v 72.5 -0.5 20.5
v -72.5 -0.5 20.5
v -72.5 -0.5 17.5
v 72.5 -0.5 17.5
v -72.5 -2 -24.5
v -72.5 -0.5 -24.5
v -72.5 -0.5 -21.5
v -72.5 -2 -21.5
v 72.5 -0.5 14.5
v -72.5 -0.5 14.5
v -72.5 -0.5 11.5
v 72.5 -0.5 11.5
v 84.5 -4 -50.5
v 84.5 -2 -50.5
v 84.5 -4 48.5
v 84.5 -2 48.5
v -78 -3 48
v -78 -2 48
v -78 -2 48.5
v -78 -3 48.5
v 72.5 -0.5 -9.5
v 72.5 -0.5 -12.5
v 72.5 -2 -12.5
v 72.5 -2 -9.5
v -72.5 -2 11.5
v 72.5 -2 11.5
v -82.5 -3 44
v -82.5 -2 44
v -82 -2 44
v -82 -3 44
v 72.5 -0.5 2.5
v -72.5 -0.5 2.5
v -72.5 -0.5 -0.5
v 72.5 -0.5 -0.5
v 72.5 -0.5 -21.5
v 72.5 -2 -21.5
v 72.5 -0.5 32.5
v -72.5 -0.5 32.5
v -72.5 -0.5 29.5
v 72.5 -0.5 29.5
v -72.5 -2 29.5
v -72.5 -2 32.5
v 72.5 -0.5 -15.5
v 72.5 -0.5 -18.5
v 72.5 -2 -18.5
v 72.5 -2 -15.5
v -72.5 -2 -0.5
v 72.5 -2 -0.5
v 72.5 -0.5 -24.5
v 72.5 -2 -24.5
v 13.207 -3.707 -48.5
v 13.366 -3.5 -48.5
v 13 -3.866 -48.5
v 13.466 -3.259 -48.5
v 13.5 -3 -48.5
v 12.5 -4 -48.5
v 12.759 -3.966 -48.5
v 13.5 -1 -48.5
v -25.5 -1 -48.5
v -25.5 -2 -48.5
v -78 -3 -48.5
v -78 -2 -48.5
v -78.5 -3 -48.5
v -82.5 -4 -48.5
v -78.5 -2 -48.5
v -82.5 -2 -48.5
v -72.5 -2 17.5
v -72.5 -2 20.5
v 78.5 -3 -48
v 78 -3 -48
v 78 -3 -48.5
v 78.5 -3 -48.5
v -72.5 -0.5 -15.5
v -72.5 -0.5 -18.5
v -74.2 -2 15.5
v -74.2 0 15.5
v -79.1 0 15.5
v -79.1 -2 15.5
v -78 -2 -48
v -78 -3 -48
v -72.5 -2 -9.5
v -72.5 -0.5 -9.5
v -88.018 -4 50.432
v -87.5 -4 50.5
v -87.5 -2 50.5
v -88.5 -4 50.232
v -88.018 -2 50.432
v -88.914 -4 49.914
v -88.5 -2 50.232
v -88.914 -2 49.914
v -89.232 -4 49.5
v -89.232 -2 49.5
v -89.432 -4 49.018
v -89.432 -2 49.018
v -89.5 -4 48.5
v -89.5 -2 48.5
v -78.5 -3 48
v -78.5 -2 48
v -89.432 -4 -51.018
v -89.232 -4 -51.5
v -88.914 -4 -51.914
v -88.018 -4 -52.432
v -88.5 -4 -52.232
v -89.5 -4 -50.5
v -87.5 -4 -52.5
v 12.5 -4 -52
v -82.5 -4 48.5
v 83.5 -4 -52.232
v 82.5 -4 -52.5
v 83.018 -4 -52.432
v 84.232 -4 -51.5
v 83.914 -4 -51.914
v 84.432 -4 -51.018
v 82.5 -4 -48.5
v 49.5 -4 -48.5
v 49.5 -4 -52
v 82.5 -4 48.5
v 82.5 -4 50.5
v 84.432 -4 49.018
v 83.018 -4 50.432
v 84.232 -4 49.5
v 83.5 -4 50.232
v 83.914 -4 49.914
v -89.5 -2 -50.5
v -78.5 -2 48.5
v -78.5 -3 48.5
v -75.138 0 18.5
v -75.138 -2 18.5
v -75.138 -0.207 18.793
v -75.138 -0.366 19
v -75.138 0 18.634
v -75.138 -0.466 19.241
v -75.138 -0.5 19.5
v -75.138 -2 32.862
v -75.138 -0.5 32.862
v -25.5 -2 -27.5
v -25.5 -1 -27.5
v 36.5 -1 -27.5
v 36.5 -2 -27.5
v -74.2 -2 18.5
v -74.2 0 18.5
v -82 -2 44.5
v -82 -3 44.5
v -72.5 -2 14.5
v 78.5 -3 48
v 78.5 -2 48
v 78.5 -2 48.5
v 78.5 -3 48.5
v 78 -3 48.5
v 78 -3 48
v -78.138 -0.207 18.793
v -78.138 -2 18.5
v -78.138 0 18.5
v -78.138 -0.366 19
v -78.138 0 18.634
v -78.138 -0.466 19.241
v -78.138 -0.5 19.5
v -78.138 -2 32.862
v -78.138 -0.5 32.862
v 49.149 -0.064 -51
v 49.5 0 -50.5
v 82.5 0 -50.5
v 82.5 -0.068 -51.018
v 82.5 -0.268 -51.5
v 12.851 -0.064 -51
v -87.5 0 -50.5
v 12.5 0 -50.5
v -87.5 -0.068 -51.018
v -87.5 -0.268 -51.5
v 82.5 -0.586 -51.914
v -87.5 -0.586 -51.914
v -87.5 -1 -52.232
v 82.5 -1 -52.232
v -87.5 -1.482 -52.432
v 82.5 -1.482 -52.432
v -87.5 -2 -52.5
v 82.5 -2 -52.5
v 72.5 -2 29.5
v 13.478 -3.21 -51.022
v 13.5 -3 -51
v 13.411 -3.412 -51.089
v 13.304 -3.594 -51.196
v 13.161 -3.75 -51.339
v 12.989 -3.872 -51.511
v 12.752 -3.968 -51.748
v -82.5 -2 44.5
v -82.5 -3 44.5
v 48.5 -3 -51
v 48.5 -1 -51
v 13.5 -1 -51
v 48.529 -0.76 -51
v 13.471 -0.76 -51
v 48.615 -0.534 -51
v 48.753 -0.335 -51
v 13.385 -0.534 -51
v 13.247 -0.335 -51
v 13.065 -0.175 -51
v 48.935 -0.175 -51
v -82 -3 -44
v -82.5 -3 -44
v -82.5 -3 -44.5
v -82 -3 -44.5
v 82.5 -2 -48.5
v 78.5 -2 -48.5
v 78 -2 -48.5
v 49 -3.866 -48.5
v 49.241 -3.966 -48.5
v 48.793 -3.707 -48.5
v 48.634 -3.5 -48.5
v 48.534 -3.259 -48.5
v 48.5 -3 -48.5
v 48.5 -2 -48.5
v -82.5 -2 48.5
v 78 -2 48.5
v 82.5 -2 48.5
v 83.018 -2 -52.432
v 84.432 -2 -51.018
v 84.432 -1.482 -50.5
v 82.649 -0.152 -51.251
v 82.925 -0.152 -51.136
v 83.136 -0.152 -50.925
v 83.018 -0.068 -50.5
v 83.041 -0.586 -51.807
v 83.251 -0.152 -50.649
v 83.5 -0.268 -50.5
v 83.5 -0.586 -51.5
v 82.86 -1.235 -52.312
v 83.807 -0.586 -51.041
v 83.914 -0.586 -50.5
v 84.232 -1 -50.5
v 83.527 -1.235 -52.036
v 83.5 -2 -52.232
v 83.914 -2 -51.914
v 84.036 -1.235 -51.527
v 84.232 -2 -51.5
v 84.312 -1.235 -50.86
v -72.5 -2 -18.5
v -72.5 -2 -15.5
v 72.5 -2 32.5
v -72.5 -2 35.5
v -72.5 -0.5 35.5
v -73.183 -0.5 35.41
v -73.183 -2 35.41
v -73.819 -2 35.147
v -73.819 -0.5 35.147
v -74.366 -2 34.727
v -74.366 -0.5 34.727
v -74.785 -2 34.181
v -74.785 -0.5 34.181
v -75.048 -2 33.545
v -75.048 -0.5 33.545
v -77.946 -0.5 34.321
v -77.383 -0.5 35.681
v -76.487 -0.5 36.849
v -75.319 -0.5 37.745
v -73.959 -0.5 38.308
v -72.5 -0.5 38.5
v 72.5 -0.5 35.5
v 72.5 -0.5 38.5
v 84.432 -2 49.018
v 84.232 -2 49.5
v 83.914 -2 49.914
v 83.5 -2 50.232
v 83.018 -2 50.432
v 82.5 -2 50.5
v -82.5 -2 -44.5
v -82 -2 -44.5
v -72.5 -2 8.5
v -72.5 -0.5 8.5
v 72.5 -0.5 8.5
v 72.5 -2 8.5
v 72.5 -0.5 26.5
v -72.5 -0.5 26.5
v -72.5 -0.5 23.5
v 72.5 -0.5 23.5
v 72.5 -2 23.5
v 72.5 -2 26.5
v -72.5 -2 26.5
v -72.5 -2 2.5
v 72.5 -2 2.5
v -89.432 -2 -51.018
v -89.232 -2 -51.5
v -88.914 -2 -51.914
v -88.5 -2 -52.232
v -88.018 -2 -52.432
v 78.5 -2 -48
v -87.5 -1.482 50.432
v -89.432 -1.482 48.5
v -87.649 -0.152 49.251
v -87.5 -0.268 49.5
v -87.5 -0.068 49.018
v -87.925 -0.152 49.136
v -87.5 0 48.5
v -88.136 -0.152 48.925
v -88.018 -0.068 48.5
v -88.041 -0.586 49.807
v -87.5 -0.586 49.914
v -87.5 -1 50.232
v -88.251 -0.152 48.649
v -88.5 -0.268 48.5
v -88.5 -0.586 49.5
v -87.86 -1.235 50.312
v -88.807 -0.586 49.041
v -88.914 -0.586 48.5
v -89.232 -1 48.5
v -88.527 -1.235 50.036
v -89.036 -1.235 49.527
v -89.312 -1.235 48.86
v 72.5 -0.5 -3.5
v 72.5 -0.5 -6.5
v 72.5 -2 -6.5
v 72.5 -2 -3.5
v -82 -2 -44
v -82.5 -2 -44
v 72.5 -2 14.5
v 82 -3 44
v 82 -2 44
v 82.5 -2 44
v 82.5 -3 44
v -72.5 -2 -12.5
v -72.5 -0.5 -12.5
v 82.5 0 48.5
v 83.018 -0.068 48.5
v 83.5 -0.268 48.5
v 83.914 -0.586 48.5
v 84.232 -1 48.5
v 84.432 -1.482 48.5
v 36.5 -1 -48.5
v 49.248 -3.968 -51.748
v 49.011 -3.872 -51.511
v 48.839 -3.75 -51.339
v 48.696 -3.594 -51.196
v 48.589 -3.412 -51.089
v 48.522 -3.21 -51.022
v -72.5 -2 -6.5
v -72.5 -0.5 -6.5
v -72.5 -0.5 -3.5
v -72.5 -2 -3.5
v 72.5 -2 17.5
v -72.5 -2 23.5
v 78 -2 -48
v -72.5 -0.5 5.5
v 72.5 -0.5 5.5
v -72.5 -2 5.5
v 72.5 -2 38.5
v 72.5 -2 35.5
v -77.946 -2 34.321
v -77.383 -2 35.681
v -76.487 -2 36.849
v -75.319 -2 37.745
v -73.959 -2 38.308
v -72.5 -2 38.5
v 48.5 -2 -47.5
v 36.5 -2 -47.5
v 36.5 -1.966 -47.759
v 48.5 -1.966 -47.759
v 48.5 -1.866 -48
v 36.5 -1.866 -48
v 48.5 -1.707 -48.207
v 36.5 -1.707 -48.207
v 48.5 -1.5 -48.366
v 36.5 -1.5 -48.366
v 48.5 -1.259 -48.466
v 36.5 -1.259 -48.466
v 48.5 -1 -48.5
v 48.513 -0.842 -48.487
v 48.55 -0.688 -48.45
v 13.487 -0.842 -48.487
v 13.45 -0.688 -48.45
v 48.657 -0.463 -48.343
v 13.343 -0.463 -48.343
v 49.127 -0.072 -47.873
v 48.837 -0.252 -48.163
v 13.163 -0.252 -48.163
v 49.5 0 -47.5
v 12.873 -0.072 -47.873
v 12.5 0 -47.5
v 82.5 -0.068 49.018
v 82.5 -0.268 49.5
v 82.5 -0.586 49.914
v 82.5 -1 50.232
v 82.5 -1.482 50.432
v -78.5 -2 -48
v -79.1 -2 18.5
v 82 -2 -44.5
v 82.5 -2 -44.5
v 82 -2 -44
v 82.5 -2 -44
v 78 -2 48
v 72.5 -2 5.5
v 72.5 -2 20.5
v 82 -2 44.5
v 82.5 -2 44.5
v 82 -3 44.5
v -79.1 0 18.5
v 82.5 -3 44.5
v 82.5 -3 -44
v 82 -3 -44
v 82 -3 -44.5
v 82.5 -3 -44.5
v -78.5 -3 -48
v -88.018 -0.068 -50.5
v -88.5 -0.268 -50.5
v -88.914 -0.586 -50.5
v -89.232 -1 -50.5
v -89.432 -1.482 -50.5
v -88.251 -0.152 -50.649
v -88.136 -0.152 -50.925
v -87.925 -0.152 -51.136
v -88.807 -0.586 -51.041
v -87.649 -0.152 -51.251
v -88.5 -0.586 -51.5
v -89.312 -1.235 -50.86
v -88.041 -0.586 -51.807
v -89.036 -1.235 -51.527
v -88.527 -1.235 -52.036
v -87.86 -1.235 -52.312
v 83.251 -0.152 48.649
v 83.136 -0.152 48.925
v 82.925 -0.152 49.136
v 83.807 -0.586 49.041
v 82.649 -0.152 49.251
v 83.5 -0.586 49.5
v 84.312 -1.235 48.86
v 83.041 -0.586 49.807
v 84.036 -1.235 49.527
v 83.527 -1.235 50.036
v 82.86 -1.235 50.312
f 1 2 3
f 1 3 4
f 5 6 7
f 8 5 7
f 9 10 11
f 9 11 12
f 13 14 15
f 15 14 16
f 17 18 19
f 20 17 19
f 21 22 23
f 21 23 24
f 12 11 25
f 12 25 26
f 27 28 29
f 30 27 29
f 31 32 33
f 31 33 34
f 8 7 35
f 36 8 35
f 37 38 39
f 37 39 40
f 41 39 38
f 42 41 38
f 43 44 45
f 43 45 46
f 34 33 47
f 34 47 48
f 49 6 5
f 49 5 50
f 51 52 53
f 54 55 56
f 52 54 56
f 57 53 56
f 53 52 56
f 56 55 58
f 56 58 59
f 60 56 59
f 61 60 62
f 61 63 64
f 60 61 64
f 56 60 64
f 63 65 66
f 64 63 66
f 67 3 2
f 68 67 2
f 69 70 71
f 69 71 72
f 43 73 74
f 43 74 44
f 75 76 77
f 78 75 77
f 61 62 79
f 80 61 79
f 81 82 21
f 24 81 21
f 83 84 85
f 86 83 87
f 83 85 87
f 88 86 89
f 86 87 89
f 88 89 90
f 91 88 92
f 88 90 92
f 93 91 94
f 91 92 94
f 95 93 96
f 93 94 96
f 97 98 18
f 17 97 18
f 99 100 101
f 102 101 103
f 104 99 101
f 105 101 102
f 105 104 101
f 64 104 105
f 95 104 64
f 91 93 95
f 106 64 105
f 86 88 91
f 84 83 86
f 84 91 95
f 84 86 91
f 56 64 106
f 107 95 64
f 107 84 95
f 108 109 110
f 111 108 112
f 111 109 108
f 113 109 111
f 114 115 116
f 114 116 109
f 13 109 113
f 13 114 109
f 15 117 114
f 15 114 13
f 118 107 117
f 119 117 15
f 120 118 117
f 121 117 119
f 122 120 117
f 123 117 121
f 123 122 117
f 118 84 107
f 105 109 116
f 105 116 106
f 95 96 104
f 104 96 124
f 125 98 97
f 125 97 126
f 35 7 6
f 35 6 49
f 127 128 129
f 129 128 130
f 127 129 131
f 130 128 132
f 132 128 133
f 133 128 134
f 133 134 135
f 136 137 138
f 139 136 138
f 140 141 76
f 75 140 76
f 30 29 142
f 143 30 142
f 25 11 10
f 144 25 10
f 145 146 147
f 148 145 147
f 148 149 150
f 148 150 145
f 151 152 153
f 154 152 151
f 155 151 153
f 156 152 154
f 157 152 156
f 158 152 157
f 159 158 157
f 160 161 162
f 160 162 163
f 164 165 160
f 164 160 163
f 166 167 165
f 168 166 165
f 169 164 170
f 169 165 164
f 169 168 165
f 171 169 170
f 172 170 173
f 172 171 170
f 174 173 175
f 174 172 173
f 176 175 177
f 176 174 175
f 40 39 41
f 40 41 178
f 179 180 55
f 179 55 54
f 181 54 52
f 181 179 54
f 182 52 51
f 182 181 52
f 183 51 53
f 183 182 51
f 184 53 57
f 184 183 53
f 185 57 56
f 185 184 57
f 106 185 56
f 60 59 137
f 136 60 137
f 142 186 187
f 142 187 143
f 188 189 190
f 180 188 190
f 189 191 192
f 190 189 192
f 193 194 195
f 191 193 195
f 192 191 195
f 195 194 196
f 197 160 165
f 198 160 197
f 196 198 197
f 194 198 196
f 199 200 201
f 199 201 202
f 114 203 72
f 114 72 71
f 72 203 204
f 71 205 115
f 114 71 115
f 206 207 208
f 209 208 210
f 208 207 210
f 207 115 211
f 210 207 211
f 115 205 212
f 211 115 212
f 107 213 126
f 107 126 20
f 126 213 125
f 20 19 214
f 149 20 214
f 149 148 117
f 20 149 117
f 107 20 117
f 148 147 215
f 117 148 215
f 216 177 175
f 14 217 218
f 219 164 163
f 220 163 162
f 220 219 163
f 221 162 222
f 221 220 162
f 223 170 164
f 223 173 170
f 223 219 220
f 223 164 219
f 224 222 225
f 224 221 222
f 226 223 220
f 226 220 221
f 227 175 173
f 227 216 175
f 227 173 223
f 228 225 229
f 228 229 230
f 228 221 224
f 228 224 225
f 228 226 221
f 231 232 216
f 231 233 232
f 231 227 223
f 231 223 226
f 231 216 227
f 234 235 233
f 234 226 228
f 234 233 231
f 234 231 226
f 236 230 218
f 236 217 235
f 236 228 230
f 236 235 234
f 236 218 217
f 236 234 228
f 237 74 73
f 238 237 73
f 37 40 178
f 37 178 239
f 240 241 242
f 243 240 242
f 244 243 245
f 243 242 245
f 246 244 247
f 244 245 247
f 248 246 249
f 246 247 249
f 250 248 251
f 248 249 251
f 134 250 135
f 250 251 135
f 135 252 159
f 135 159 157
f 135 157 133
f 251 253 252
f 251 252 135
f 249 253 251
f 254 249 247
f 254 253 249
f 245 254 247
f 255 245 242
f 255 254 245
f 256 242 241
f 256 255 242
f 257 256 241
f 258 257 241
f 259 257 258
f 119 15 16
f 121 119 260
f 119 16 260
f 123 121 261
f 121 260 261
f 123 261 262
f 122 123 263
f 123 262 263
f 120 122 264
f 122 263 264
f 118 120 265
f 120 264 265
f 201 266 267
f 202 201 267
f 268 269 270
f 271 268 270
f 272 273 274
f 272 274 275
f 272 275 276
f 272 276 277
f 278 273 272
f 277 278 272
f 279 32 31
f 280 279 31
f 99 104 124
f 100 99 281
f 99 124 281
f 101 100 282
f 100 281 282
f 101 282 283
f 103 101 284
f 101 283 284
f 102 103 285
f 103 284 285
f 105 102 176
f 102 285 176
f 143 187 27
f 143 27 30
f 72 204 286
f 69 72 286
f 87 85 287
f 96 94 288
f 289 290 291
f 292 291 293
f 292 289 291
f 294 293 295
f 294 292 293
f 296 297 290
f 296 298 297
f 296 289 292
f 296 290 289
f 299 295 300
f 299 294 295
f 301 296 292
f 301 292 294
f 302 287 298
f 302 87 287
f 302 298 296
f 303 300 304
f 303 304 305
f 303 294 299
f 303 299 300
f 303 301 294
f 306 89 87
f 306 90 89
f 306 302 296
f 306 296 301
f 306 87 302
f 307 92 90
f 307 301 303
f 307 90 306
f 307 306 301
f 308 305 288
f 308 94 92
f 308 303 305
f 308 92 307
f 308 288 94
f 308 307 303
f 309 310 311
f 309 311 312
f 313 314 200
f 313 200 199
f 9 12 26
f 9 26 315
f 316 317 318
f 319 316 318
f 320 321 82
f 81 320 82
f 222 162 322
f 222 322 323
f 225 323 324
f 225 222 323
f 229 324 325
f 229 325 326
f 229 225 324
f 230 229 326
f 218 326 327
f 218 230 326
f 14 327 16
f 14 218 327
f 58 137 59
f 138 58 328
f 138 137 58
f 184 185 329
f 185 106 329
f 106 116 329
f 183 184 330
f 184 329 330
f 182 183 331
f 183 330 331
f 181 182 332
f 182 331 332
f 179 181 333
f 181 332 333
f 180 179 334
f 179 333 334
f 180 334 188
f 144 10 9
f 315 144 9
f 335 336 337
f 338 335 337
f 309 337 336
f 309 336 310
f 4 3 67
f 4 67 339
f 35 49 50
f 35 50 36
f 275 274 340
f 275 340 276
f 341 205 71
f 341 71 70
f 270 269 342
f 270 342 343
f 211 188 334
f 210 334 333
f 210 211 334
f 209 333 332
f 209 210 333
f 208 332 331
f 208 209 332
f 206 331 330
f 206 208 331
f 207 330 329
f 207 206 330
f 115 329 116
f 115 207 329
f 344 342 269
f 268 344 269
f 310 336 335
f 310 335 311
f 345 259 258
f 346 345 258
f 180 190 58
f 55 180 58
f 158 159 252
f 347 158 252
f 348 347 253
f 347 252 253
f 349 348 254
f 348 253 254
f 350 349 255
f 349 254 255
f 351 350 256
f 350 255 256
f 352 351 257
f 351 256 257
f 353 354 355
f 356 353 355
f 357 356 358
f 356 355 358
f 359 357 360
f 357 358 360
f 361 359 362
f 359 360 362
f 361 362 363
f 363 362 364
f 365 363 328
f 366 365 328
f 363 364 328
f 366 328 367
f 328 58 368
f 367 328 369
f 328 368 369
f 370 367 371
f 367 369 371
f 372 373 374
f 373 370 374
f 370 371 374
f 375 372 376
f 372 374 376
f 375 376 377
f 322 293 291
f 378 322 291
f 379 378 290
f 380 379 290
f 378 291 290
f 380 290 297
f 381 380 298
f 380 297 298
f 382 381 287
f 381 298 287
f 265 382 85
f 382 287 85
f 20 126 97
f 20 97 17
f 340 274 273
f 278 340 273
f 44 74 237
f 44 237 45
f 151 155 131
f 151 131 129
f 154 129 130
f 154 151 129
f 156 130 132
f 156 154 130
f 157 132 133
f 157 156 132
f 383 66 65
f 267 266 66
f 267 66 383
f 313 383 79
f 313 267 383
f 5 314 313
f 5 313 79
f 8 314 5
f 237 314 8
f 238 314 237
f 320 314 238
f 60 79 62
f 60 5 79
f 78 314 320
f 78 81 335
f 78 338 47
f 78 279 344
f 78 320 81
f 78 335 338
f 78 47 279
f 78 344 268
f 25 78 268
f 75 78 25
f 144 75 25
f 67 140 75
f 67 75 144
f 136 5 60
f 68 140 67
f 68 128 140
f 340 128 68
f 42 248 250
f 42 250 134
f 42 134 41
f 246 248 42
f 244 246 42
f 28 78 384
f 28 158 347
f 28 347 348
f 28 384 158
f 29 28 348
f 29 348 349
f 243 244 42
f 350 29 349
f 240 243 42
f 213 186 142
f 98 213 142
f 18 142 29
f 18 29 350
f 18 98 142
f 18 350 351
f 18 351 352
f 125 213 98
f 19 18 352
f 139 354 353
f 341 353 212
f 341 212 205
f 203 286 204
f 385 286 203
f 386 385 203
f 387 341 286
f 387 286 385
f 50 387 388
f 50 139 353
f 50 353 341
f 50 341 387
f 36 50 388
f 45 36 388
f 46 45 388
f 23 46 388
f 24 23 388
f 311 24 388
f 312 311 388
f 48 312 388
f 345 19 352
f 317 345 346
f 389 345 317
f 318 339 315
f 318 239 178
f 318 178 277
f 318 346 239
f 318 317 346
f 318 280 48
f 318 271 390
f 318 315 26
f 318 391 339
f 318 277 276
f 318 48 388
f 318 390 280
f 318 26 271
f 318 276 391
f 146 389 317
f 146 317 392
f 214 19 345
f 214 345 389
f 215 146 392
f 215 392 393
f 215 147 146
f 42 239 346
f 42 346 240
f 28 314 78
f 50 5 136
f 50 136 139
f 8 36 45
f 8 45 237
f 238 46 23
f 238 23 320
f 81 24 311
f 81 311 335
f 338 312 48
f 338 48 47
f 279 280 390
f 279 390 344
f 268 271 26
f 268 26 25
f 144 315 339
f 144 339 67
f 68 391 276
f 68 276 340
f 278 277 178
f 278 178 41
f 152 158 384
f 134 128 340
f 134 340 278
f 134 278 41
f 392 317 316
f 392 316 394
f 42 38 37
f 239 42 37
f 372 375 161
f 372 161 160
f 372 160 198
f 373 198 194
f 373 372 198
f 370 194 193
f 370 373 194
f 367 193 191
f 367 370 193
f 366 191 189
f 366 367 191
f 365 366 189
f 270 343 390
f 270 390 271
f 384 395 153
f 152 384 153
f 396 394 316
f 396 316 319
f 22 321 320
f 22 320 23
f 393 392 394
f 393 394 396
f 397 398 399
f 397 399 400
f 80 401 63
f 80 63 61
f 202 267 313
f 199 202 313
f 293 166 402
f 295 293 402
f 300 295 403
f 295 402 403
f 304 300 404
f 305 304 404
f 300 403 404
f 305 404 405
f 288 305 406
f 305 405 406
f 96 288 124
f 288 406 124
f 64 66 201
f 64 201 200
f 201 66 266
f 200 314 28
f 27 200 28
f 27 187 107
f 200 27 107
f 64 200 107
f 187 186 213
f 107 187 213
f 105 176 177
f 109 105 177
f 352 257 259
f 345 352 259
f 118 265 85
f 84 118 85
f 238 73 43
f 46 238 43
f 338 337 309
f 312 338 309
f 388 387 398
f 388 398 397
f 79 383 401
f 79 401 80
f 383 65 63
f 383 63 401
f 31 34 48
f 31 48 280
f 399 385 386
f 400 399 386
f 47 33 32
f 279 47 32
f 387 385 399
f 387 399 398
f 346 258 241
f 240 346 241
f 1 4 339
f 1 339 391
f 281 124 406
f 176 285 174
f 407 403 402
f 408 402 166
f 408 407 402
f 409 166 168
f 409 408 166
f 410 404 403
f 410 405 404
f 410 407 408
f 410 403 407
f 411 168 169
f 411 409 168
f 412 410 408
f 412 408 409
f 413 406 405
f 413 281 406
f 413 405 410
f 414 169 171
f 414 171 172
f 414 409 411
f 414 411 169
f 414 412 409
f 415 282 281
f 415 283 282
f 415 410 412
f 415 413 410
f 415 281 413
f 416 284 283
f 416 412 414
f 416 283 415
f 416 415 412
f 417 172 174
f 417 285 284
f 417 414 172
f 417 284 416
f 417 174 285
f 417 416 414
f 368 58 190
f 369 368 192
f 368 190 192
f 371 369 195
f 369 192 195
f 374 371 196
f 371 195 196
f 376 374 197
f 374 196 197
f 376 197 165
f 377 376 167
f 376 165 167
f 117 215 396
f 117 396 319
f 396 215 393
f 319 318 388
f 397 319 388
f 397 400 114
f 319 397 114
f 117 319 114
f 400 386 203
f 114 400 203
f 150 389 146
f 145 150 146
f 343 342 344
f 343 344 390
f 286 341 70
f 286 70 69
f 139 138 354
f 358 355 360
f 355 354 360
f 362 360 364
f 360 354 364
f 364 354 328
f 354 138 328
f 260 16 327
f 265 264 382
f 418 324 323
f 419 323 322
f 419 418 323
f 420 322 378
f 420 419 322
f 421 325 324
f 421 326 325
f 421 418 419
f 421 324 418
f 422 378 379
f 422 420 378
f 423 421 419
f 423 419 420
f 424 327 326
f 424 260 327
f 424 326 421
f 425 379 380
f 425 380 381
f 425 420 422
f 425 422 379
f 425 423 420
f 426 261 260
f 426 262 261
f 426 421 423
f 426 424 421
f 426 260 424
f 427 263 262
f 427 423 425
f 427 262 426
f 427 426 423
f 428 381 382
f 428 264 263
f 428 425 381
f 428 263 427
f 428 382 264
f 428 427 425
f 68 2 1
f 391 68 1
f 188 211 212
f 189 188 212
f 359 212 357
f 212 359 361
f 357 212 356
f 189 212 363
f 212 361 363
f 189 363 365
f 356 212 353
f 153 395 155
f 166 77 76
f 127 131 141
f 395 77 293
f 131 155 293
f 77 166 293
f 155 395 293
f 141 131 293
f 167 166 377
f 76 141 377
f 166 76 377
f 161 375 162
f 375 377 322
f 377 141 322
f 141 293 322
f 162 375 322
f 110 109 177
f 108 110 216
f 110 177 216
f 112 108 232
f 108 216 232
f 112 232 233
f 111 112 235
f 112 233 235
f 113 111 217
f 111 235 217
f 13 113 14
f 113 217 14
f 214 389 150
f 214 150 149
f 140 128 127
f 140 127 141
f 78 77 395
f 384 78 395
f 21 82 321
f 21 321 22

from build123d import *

# Parameters (mm, degrees)
F1_DEPTH     = 1
F0_W         = 145
F0_H         = 3
F2_DEPTH     = 2
F3_DEPTH     = 0.5
F0_W_2       = 0.5
F0_H_2       = 0.5
F4_DEPTH     = 3
F5_DEPTH     = 4
F6_T1_DEPTH  = 99
F6_T3_DEPTH  = 170
F6_T6_ANGLE  = 90
F6_T8_ANGLE  = 90
F6_T10_ANGLE = 90
F6_T12_ANGLE = 90
F7_T1_DEPTH  = 35
F7_T3_DEPTH  = 5
F7_T5_DEPTH  = 14.5
F7_T7_DEPTH  = 2.9999986291
F7_T12_DEPTH = 4.5
F7_T17_DEPTH = 4.5
F7_T23_DEPTH = 5
F7_T28_DEPTH = 37.5
F7_T35_DEPTH = 5
F7_T40_DEPTH = 37.5
F7_T47_DEPTH = 37.5
F7_T51_DEPTH = 7
F7_T58_DEPTH = 37.5
F7_T62_DEPTH = 7


# Not quite as in the source:
# - a fillet or chamfer that OpenCascade refuses, or shapes differently, is made with other operations: its cross-section is extruded or revolved along the edge and cut away or added
# - two fillets or chamfers of one size are made in one step
# - ends of sketch curves that miss each other by under 0.0002 mm in the source are joined
# - a feature names something its author has since deleted; it is built from what else it names


with BuildPart() as f1:
    # F0 (on Front) → F1 (new body)
    with BuildSketch(Plane.XZ):
        Polygon((-25.5, -27.5), (-25.5, -48.5), (13.5, -48.5), (36.5, -48.5), (36.5, -27.5), align=None)
    extrude(amount=F1_DEPTH)

    # F0 (on Front) → F2 (join)
    with BuildSketch(Plane.XZ):
        Polygon((-78.5, 48.5), (-82.5, 48.5), (-82.5, 44.5), (-82, 44.5), (-82, 44), (-82.5, 44), (-82.5, -44), (-82, -44), (-82, -44.5), (-82.5, -44.5), (-82.5, -48.5), (-78.5, -48.5), (-78.5, -48), (-78, -48), (-78, -48.5), (-25.5, -48.5), (-25.5, -27.5), (36.5, -27.5), (36.5, -48.5), (48.5, -48.5), (78, -48.5), (78, -48), (78.5, -48), (78.5, -48.5), (82.5, -48.5), (82.5, -44.5), (82, -44.5), (82, -44), (82.5, -44), (82.5, 44), (82, 44), (82, 44.5), (82.5, 44.5), (82.5, 48.5), (78.5, 48.5), (78.5, 48), (78, 48), (78, 48.5), (-78, 48.5), (-78, 48), (-78.5, 48), align=None)
        with Locations((0, -23)):
            Rectangle(F0_W, F0_H, mode=Mode.SUBTRACT)
        with Locations((0, -17)):
            Rectangle(F0_W, F0_H, mode=Mode.SUBTRACT)
        with Locations((0, -11)):
            Rectangle(F0_W, F0_H, mode=Mode.SUBTRACT)
        with Locations((0, -5)):
            Rectangle(F0_W, F0_H, mode=Mode.SUBTRACT)
        with BuildLine():
            ThreePointArc((-78.1382620335, 32.8617365956), (-76.486853318, 36.8485899136), (-72.5, 38.4999986291))
            Line((-72.5, 38.4999986291), (72.5, 38.5))
            Line((72.5, 38.5), (72.5, 35.5))
            Line((72.5, 35.5), (-72.5, 35.5))
            ThreePointArc((-72.5, 35.5), (-74.3655339438, 34.7272705394), (-75.1382634044, 32.8617365956))
            Line((-75.1382634044, 32.8617365956), (-75.1382634044, 18.5))
            Line((-75.1382634044, 18.5), (-74.2, 18.5))
            Line((-74.2, 18.5), (-74.2, 15.5))
            Line((-74.2, 15.5), (-79.1, 15.5))
            Line((-79.1, 15.5), (-79.1, 18.5))
            Line((-79.1, 18.5), (-78.1382620335, 18.5))
            Line((-78.1382620335, 18.5), (-78.1382620335, 32.8617365956))
        make_face(mode=Mode.SUBTRACT)
        with Locations((0, 1)):
            Rectangle(F0_W, F0_H, mode=Mode.SUBTRACT)
        with Locations((0, 7)):
            Rectangle(F0_W, F0_H, mode=Mode.SUBTRACT)
        with Locations((0, 13)):
            Rectangle(F0_W, F0_H, mode=Mode.SUBTRACT)
        with Locations((0, 19)):
            Rectangle(F0_W, F0_H, mode=Mode.SUBTRACT)
        with Locations((0, 25)):
            Rectangle(F0_W, F0_H, mode=Mode.SUBTRACT)
        with Locations((0, 31)):
            Rectangle(F0_W, F0_H, mode=Mode.SUBTRACT)
    extrude(amount=F2_DEPTH)

    # F0 (on Front) → F3 (join)
    with BuildSketch(Plane.XZ):
        with Locations((0, 37)):
            Rectangle(F0_W, F0_H)
        with Locations((0, 31)):
            Rectangle(F0_W, F0_H)
        with Locations((0, 25)):
            Rectangle(F0_W, F0_H)
        with Locations((0, 19)):
            Rectangle(F0_W, F0_H)
        with Locations((0, 13)):
            Rectangle(F0_W, F0_H)
        with Locations((0, 7)):
            Rectangle(F0_W, F0_H)
        with Locations((0, 1)):
            Rectangle(F0_W, F0_H)
        with Locations((0, -5)):
            Rectangle(F0_W, F0_H)
        with Locations((0, -11)):
            Rectangle(F0_W, F0_H)
        with Locations((0, -17)):
            Rectangle(F0_W, F0_H)
        with Locations((0, -23)):
            Rectangle(F0_W, F0_H)
        with BuildLine():
            Line((-72.5, 35.5), (-72.5, 38.5))
            ThreePointArc((-72.5, 38.5), (-76.486853318, 36.8485899136), (-78.1382620335, 32.8617365956))
            Line((-78.1382620335, 32.8617365956), (-78.1382620335, 18.5))
            Line((-78.1382620335, 18.5), (-75.1382634044, 18.5))
            Line((-75.1382634044, 18.5), (-75.1382634044, 32.8617365956))
            ThreePointArc((-75.1382634044, 32.8617365956), (-74.3655339438, 34.7272705394), (-72.5, 35.5))
        make_face()
    extrude(amount=F3_DEPTH)

    # F0 (on Front) → F4 (join)
    with BuildSketch(Plane.XZ):
        with Locations((-82.25, 44.25)):
            Rectangle(F0_W_2, F0_H_2)
        with Locations((-78.25, 48.25)):
            Rectangle(F0_W_2, F0_H_2)
        with Locations((-82.25, -44.25)):
            Rectangle(F0_W_2, F0_H_2)
        with Locations((-78.25, -48.25)):
            Rectangle(F0_W_2, F0_H_2)
        with Locations((82.25, -44.25)):
            Rectangle(F0_W_2, F0_H_2)
        with Locations((78.25, -48.25)):
            Rectangle(F0_W_2, F0_H_2)
        with Locations((78.25, 48.25)):
            Rectangle(F0_W_2, F0_H_2)
        with Locations((82.25, 44.25)):
            Rectangle(F0_W_2, F0_H_2)
    extrude(amount=F4_DEPTH)

    # F0 (on Front) → F5 (join)
    with BuildSketch(Plane.XZ):
        with BuildLine():
            Line((82.5, 50.5), (-87.5, 50.5))
            ThreePointArc((-87.5, 50.5), (-88.9142135624, 49.9142135624), (-89.5, 48.5))
            Line((-89.5, 48.5), (-89.5, -50.5))
            ThreePointArc((-89.5, -50.5), (-88.9142135624, -51.9142135624), (-87.5, -52.5))
            Line((-87.5, -52.5), (82.5, -52.5))
            ThreePointArc((82.5, -52.5), (83.9142135624, -51.9142135624), (84.5, -50.5))
            Line((84.5, -50.5), (84.5, 48.5))
            ThreePointArc((84.5, 48.5), (83.9142135624, 49.9142135624), (82.5, 50.5))
        make_face()
        Polygon((-82.5, 44.5), (-82.5, 48.5), (-78.5, 48.5), (-78, 48.5), (78, 48.5), (78.5, 48.5), (82.5, 48.5), (82.5, 44.5), (82.5, 44), (82.5, -44), (82.5, -44.5), (82.5, -48.5), (78.5, -48.5), (78, -48.5), (48.5, -48.5), (48.5, -51), (13.5, -51), (13.5, -48.5), (-25.5, -48.5), (-78, -48.5), (-78.5, -48.5), (-82.5, -48.5), (-82.5, -44.5), (-82.5, -44), (-82.5, 44), align=None, mode=Mode.SUBTRACT)
    extrude(amount=F5_DEPTH)

    # F6: fillet of radius 2 on 8 edges, made by hand

    # F6_s2 → F6_t1 (cut)
    with BuildSketch(Plane.XY.offset(-50.5)):
        with BuildLine():
            ThreePointArc((82.5, 0), (83.9142135624, -0.5857864376), (84.5, -2))
            Line((84.5, -2), (84.5, 0))
            Line((84.5, 0), (82.5, 0))
        make_face()
        with BuildLine():
            ThreePointArc((-87.5, 0), (-88.9142135624, -0.5857864376), (-89.5, -2))
            Line((-89.5, -2), (-89.5, 0))
            Line((-89.5, 0), (-87.5, 0))
        make_face()
    extrude(amount=F6_T1_DEPTH, mode=Mode.SUBTRACT)

    # F6_s4 → F6_t3 (cut)
    with BuildSketch(Plane.YZ.offset(-87.5)):
        with BuildLine():
            ThreePointArc((0, 48.5), (-0.5857864376, 49.9142135624), (-2, 50.5))
            Line((-2, 50.5), (0, 50.5))
            Line((0, 50.5), (0, 48.5))
        make_face()
        with BuildLine():
            ThreePointArc((0, -50.5), (-0.5857864376, -51.9142135624), (-2, -52.5))
            Line((-2, -52.5), (0, -52.5))
            Line((0, -52.5), (0, -50.5))
        make_face()
    extrude(amount=F6_T3_DEPTH, mode=Mode.SUBTRACT)

    # F6_s5 → F6_t6 (revolve, cut)
    with BuildSketch(Plane.YZ.offset(-87.5)):
        with BuildLine():
            ThreePointArc((0, 48.5), (-0.5857864376, 49.9142135624), (-2, 50.5))
            Line((-2, 50.5), (0, 50.5))
            Line((0, 50.5), (0, 48.5))
        make_face()
    revolve(axis=Axis((-87.5, 0, 48.5), (0, -1, 0)), revolution_arc=F6_T6_ANGLE, mode=Mode.SUBTRACT)

    # F6_s7 → F6_t8 (revolve, cut)
    with BuildSketch(Plane.XY.offset(-50.5)):
        with BuildLine():
            ThreePointArc((-87.5, 0), (-88.9142135624, -0.5857864376), (-89.5, -2))
            Line((-89.5, -2), (-89.5, 0))
            Line((-89.5, 0), (-87.5, 0))
        make_face()
    revolve(axis=Axis((-87.5, 0, -50.5), (0, -1, 0)), revolution_arc=F6_T8_ANGLE, mode=Mode.SUBTRACT)

    # F6_s9 → F6_t10 (revolve, cut)
    with BuildSketch(Plane.YZ.offset(82.5)):
        with BuildLine():
            ThreePointArc((0, -50.5), (-0.5857864376, -51.9142135624), (-2, -52.5))
            Line((-2, -52.5), (0, -52.5))
            Line((0, -52.5), (0, -50.5))
        make_face()
    revolve(axis=Axis((82.5, 0, -50.5), (0, -1, 0)), revolution_arc=F6_T10_ANGLE, mode=Mode.SUBTRACT)

    # F6_s11 → F6_t12 (revolve, cut)
    with BuildSketch(Plane.XY.offset(48.5)):
        with BuildLine():
            ThreePointArc((82.5, 0), (83.9142135624, -0.5857864376), (84.5, -2))
            Line((84.5, -2), (84.5, 0))
            Line((84.5, 0), (82.5, 0))
        make_face()
    revolve(axis=Axis((82.5, 0, 48.5), (0, -1, 0)), revolution_arc=F6_T12_ANGLE, mode=Mode.SUBTRACT)

    # F7: fillet of radius 1 on 8 edges, made by hand

    # F7_s2 → F7_t1 (cut)
    with BuildSketch(Plane.YZ.offset(13.5)):
        with BuildLine():
            ThreePointArc((-4, -52), (-3.7071067812, -51.2928932188), (-3, -51))
            Line((-3, -51), (-4, -51))
            Line((-4, -51), (-4, -52))
        make_face()
        with BuildLine():
            ThreePointArc((-1, -48.5), (-0.2928932188, -48.2071067812), (0, -47.5))
            Line((0, -47.5), (0, -48.5))
            Line((0, -48.5), (-1, -48.5))
        make_face()
    extrude(amount=F7_T1_DEPTH, mode=Mode.SUBTRACT)

    # F7_s4 → F7_t3 (cut)
    with BuildSketch(Plane.XY.offset(-51)):
        with BuildLine():
            ThreePointArc((48.5, -3), (48.7928932188, -3.7071067812), (49.5, -4))
            Line((49.5, -4), (48.5, -4))
            Line((48.5, -4), (48.5, -3))
        make_face()
        with BuildLine():
            ThreePointArc((13.5, -3), (13.2071067812, -3.7071067812), (12.5, -4))
            Line((12.5, -4), (13.5, -4))
            Line((13.5, -4), (13.5, -3))
        make_face()
    extrude(amount=F7_T3_DEPTH, mode=Mode.SUBTRACT)

    # F7_s6 → F7_t5 (cut)
    with BuildSketch(Plane.YZ.offset(34)):
        with BuildLine():
            ThreePointArc((-1, -48.5), (-1.7071067812, -48.2071067812), (-2, -47.5))
            Line((-2, -47.5), (-2, -48.5))
            Line((-2, -48.5), (-1, -48.5))
        make_face()
    extrude(amount=F7_T5_DEPTH, mode=Mode.SUBTRACT)

    # F7_s8 → F7_t7 (cut)
    with BuildSketch(Plane.YZ.offset(-78.1382620335)):
        with BuildLine():
            ThreePointArc((0.5, 18.5), (-0.2071067812, 18.7928932188), (-0.5, 19.5))
            Line((-0.5, 19.5), (-0.5, 18.5))
            Line((-0.5, 18.5), (0.5, 18.5))
        make_face()
    extrude(amount=F7_T7_DEPTH, mode=Mode.SUBTRACT)


with BuildPart() as f7_tool10:
    # F7_s11 → F7_t12 (new body)
    with BuildSketch(Plane.XY.offset(-53)):
        with BuildLine():
            ThreePointArc((13.5, -1), (13.2071067812, -0.2928932188), (12.5, 0))
            Line((12.5, 0), (13.5, 0))
            Line((13.5, 0), (13.5, -1))
        make_face()
    extrude(amount=F7_T12_DEPTH)

    split(bisect_by=Plane.XY.offset(-51), keep=Keep.TOP)


with BuildPart() as f1_1:
    add(f1.part)

    # F7_t9: cut F7_tool10
    add(f7_tool10.part, mode=Mode.SUBTRACT)


with BuildPart() as f7_tool15:
    # F7_s16 → F7_t17 (new body)
    with BuildSketch(Plane.XY.offset(-48.5)):
        with BuildLine():
            ThreePointArc((49.5, 0), (48.7928932188, -0.2928932188), (48.5, -1))
            Line((48.5, -1), (48.5, 0))
            Line((48.5, 0), (49.5, 0))
        make_face()
    extrude(amount=-F7_T17_DEPTH)

    split(bisect_by=Plane.XY.offset(-51), keep=Keep.TOP)


with BuildPart() as f1_2:
    add(f1_1.part)

    # F7_t14: cut F7_tool15
    add(f7_tool15.part, mode=Mode.SUBTRACT)


with BuildPart() as f7_tool21:
    # F7_s22 → F7_t23 (new body)
    with BuildSketch(Plane.XY.offset(-48.5)):
        with BuildLine():
            ThreePointArc((48.5, -3), (48.7928932188, -3.7071067812), (49.5, -4))
            Line((49.5, -4), (48.5, -4))
            Line((48.5, -4), (48.5, -3))
        make_face()
    extrude(amount=-F7_T23_DEPTH)

    split(bisect_by=Plane.XY.offset(-51), keep=Keep.BOTTOM)

    split(bisect_by=Plane.XY.offset(-52.5), keep=Keep.TOP)


with BuildPart() as f7_tool26:
    # F7_s27 → F7_t28 (new body)
    with BuildSketch(Plane.YZ.offset(51)):
        with BuildLine():
            ThreePointArc((-4, -52), (-3.7071067812, -51.2928932188), (-3, -51))
            Line((-3, -51), (-4, -51))
            Line((-4, -51), (-4, -52))
        make_face()
    extrude(amount=-F7_T28_DEPTH)

    split(bisect_by=Plane.YZ.offset(48.5), keep=Keep.TOP)


with BuildPart() as f7_tool21_1:
    add(f7_tool21.part)

    # F7_t30: intersect F7_tool26
    add(f7_tool26.part, mode=Mode.INTERSECT)


with BuildPart() as f1_3:
    add(f1_2.part)

    # F7_t19: cut F7_tool21
    add(f7_tool21_1.part, mode=Mode.SUBTRACT)


with BuildPart() as f7_tool33:
    # F7_s34 → F7_t35 (new body)
    with BuildSketch(Plane.XY.offset(-53.5)):
        with BuildLine():
            ThreePointArc((13.5, -3), (13.2071067812, -3.7071067812), (12.5, -4))
            Line((12.5, -4), (13.5, -4))
            Line((13.5, -4), (13.5, -3))
        make_face()
    extrude(amount=F7_T35_DEPTH)

    split(bisect_by=Plane.XY.offset(-51), keep=Keep.BOTTOM)

    split(bisect_by=Plane.XY.offset(-52.5), keep=Keep.TOP)


with BuildPart() as f7_tool38:
    # F7_s39 → F7_t40 (new body)
    with BuildSketch(Plane.YZ.offset(48.5)):
        with BuildLine():
            ThreePointArc((-4, -52), (-3.7071067812, -51.2928932188), (-3, -51))
            Line((-3, -51), (-4, -51))
            Line((-4, -51), (-4, -52))
        make_face()
    extrude(amount=-F7_T40_DEPTH)

    split(bisect_by=Plane.YZ.offset(13.5), keep=Keep.BOTTOM)


with BuildPart() as f7_tool33_1:
    add(f7_tool33.part)

    # F7_t42: intersect F7_tool38
    add(f7_tool38.part, mode=Mode.INTERSECT)


with BuildPart() as f1_4:
    add(f1_3.part)

    # F7_t31: cut F7_tool33
    add(f7_tool33_1.part, mode=Mode.SUBTRACT)


with BuildPart() as f7_tool45:
    # F7_s46 → F7_t47 (new body)
    with BuildSketch(Plane.YZ.offset(11)):
        with BuildLine():
            ThreePointArc((-1, -48.5), (-0.2928932188, -48.2071067812), (0, -47.5))
            Line((0, -47.5), (0, -48.5))
            Line((0, -48.5), (-1, -48.5))
        make_face()
    extrude(amount=F7_T47_DEPTH)

    split(bisect_by=Plane.YZ.offset(13.5), keep=Keep.BOTTOM)


with BuildPart() as f7_tool49:
    # F7_s50 → F7_t51 (new body)
    with BuildSketch(Plane.XY.offset(-53)):
        with BuildLine():
            ThreePointArc((13.5, -1), (13.2071067812, -0.2928932188), (12.5, 0))
            Line((12.5, 0), (13.5, 0))
            Line((13.5, 0), (13.5, -1))
        make_face()
    extrude(amount=F7_T51_DEPTH)

    split(bisect_by=Plane.XY.offset(-48.5), keep=Keep.TOP)


with BuildPart() as f7_tool45_1:
    add(f7_tool45.part)

    # F7_t53: intersect F7_tool49
    add(f7_tool49.part, mode=Mode.INTERSECT)


with BuildPart() as f1_5:
    add(f1_4.part)

    # F7_t43: cut F7_tool45
    add(f7_tool45_1.part, mode=Mode.SUBTRACT)


with BuildPart() as f7_tool56:
    # F7_s57 → F7_t58 (new body)
    with BuildSketch(Plane.YZ.offset(13.5)):
        with BuildLine():
            ThreePointArc((-1, -48.5), (-0.2928932188, -48.2071067812), (0, -47.5))
            Line((0, -47.5), (0, -48.5))
            Line((0, -48.5), (-1, -48.5))
        make_face()
    extrude(amount=F7_T58_DEPTH)

    split(bisect_by=Plane.YZ.offset(48.5), keep=Keep.TOP)


with BuildPart() as f7_tool60:
    # F7_s61 → F7_t62 (new body)
    with BuildSketch(Plane.XY.offset(-46)):
        with BuildLine():
            ThreePointArc((49.5, 0), (48.7928932188, -0.2928932188), (48.5, -1))
            Line((48.5, -1), (48.5, 0))
            Line((48.5, 0), (49.5, 0))
        make_face()
    extrude(amount=-F7_T62_DEPTH)

    split(bisect_by=Plane.XY.offset(-48.5), keep=Keep.TOP)


with BuildPart() as f7_tool56_1:
    add(f7_tool56.part)

    # F7_t64: intersect F7_tool60
    add(f7_tool60.part, mode=Mode.INTERSECT)


with BuildPart() as f1_6:
    add(f1_5.part)

    # F7_t54: cut F7_tool56
    add(f7_tool56_1.part, mode=Mode.SUBTRACT)


solid = f1_6.part
